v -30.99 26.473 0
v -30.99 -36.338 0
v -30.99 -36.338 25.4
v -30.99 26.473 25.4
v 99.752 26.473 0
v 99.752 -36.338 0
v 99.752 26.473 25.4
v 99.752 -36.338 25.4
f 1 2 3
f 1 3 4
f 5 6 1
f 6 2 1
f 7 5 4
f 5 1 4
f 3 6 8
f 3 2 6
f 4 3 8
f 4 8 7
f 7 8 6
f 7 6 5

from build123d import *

# Parameters (mm, degrees)
F0_W     = 79.9421519041
F0_H     = 62.8107488155
F1_DEPTH = 25.4
F4_W     = 62.8107488155
F4_H     = 25.4
F5_DEPTH = 25.4
F2_W     = 62.8107488155
F2_H     = 25.4
F6_DEPTH = 25.4


with BuildPart() as f1:
    # F0 (on Top) → F1 (new body)
    with BuildSketch(Plane.XY):
        with Locations((8.9811533689, -4.9324259162)):
            Rectangle(F0_W, F0_H)
    extrude(amount=F1_DEPTH)



with BuildPart() as f5:
    # F4 (on offset) → F5 (new body)
    with BuildSketch(Plane.YZ.offset(74.352229321)):
        with Locations((-4.9324259162, 12.7)):
            Rectangle(F4_W, F4_H)
    extrude(amount=F5_DEPTH)


with BuildPart() as f1_1:
    add(f1.part)

    add(f5.part)  # F6 merges F5
    # F2 (on face) → F6 (join, through all)
    with BuildSketch(Plane.YZ.offset(48.952229321)):
        with Locations((-4.9324259162, 12.7)):
            Rectangle(F2_W, F2_H)
    extrude(amount=F6_DEPTH)


solid = f1_1.part
